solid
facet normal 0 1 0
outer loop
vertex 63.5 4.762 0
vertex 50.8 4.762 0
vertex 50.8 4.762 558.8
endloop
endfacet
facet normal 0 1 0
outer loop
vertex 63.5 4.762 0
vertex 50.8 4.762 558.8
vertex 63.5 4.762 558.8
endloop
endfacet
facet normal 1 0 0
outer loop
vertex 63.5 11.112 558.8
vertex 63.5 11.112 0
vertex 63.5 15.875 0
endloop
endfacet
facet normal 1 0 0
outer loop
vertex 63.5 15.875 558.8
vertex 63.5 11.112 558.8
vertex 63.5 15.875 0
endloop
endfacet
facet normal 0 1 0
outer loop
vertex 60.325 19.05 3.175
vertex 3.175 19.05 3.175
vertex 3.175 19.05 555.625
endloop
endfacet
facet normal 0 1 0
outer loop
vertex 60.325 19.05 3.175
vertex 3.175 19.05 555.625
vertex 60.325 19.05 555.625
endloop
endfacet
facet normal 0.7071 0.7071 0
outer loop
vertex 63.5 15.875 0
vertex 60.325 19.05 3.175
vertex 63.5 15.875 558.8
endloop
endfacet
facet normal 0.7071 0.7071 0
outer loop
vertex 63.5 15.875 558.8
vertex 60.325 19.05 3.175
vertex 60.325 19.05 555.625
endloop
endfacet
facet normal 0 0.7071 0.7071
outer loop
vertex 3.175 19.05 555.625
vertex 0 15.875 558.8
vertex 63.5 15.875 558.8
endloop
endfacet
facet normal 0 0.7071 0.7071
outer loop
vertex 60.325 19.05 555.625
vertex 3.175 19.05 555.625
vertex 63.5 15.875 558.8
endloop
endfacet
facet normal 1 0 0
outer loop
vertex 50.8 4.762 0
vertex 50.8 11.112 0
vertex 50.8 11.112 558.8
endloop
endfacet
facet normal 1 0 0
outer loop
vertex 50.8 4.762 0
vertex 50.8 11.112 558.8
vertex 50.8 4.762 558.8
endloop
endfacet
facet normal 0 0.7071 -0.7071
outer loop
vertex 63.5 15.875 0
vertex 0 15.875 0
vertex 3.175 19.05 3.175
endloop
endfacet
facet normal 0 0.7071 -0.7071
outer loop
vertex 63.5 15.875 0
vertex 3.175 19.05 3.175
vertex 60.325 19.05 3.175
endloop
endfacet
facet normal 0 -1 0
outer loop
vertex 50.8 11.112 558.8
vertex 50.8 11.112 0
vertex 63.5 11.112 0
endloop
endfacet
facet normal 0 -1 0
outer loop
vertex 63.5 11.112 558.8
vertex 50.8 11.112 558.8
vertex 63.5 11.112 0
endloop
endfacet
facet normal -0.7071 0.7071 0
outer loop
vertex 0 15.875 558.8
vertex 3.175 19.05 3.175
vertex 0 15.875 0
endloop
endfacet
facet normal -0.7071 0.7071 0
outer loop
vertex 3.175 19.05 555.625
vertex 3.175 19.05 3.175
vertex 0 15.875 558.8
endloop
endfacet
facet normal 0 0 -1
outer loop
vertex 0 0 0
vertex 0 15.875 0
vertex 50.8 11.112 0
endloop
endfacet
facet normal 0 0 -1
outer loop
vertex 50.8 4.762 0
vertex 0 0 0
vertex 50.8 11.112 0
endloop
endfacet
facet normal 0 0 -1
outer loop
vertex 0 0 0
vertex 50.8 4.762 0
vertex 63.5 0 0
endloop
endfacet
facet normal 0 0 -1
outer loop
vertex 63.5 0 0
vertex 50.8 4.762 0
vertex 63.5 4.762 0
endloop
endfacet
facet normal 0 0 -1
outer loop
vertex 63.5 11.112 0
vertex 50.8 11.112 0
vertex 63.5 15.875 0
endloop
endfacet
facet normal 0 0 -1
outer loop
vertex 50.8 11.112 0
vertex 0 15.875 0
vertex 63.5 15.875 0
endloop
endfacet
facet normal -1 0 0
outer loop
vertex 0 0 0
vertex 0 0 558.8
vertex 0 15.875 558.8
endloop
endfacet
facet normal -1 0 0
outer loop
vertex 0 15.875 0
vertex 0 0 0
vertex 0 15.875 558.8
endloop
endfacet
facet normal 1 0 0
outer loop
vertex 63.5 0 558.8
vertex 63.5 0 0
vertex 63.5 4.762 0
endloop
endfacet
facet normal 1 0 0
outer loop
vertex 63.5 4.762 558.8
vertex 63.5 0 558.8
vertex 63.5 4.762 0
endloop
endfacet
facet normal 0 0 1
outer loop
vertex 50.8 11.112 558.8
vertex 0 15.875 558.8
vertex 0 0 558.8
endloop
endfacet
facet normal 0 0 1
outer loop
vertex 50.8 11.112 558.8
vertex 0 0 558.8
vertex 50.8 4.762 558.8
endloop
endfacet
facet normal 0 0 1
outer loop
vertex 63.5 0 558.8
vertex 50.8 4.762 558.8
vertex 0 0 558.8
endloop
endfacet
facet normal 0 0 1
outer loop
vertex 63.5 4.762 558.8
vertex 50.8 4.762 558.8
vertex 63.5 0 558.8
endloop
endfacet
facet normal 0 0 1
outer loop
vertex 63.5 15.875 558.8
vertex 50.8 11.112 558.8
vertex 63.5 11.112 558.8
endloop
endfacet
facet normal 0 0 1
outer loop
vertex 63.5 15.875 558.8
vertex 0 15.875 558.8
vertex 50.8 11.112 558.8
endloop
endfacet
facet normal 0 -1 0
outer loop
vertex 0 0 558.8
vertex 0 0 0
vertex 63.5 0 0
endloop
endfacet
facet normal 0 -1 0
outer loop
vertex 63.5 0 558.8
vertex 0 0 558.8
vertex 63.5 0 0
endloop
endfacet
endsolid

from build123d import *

# Parameters (mm, degrees)
F0_W     = 63.5
F0_H     = 19.05
F1_DEPTH = 558.8
F2_SIZE  = 3.175
F3_W     = 12.7
F3_H     = 6.35
F4_DEPTH = 558.801


with BuildPart() as f1:
    # F0 (on Top) → F1 (new body)
    with BuildSketch(Plane.XY):
        with Locations((31.75, 9.525)):
            Rectangle(F0_W, F0_H)
    extrude(amount=F1_DEPTH)

    # F2
    f2_edges = [f1.edges().sort_by_distance(p)[0] for p in [
        (0, 19.05, 279.4),
        (63.5, 19.05, 279.4),
        (31.75, 19.05, 0),
        (31.75, 19.05, 558.8),
    ]]
    chamfer(f2_edges, length=F2_SIZE)

    # F3 (on face) → F4 (cut, through all)
    with BuildSketch(Plane(origin=(0, 0, 0), x_dir=(1, 0, 0), z_dir=(0, 0, -1))):
        with Locations((57.15, -7.9375)):
            Rectangle(F3_W, F3_H)
    extrude(amount=-F4_DEPTH, mode=Mode.SUBTRACT)


solid = f1.part
